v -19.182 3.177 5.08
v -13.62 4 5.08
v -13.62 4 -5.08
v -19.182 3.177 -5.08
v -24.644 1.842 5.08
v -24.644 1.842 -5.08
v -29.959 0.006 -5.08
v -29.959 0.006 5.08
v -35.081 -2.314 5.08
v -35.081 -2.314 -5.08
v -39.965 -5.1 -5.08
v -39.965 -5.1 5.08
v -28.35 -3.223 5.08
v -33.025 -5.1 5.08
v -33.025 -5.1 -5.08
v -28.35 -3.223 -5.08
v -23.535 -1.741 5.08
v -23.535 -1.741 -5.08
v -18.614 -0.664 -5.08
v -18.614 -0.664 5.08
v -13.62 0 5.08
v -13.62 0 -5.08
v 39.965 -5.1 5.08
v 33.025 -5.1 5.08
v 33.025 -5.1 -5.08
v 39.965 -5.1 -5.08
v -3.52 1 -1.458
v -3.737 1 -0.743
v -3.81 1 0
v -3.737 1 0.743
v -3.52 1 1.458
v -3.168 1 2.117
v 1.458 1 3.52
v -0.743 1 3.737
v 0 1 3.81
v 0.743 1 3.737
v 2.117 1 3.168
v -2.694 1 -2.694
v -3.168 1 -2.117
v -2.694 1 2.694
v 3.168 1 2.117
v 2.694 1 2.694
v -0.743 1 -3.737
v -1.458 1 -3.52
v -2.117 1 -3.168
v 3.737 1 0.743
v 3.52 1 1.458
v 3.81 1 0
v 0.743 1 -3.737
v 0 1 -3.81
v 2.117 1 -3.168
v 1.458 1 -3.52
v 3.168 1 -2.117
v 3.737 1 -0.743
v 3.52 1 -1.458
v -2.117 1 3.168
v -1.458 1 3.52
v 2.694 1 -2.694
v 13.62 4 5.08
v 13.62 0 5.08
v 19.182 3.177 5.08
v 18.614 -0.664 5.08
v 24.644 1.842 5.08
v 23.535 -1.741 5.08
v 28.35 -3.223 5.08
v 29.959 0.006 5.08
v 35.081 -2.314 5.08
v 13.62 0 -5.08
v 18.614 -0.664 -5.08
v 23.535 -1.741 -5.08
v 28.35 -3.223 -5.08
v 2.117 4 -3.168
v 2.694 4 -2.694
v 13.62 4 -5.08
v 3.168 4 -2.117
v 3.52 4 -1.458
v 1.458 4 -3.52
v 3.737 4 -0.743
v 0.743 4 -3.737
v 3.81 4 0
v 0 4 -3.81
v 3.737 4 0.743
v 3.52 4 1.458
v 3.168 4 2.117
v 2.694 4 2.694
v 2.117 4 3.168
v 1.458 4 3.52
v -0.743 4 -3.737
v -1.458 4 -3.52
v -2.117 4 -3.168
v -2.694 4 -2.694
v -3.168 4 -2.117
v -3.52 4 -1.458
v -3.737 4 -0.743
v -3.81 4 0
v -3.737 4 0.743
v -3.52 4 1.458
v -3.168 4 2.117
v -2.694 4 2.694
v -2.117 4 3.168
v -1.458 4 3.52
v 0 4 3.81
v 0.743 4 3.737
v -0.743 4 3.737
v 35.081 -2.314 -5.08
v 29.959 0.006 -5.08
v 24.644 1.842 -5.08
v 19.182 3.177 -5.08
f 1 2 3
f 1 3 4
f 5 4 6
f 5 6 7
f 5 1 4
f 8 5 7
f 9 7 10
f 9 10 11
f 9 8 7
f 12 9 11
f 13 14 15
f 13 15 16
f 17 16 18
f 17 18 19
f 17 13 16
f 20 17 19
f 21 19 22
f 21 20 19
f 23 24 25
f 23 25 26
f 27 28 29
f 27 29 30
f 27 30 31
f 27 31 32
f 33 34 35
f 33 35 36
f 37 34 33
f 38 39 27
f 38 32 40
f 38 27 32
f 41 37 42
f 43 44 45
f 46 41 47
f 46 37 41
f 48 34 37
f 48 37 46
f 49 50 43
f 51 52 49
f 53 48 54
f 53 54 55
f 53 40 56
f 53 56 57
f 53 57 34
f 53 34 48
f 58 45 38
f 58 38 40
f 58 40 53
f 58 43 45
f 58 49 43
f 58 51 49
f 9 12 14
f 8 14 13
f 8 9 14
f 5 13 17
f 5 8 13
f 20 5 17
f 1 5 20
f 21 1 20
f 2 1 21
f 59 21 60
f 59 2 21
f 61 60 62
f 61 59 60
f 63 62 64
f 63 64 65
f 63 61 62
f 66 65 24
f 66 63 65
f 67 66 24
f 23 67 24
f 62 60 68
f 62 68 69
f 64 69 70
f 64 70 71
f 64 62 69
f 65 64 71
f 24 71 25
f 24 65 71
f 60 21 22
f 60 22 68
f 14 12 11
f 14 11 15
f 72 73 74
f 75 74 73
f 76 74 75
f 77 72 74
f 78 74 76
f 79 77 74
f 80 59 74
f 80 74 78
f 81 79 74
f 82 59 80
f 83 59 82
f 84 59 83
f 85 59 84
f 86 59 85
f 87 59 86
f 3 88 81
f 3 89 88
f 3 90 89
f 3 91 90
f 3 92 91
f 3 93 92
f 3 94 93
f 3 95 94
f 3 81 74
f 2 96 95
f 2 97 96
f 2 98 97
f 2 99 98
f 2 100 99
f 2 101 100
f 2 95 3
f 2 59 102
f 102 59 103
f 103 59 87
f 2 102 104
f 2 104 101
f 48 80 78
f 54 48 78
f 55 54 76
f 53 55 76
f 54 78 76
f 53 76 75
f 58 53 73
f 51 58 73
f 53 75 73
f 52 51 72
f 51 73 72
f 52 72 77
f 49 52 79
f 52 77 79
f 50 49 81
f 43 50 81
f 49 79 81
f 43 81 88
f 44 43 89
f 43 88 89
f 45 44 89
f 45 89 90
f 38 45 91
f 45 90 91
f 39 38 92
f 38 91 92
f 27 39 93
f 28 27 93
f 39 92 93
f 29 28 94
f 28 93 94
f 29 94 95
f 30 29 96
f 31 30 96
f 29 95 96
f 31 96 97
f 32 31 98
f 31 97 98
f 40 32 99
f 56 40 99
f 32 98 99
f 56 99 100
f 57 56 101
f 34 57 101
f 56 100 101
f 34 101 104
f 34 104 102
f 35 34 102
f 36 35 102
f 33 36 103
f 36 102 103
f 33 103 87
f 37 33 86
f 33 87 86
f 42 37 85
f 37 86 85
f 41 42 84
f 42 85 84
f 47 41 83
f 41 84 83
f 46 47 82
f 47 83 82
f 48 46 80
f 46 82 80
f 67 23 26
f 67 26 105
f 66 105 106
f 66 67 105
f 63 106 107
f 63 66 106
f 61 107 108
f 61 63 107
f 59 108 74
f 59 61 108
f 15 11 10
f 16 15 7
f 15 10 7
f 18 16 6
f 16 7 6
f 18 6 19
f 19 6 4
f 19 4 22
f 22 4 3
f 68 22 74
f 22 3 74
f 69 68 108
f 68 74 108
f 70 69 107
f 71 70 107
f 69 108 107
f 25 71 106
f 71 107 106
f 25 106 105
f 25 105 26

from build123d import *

# Parameters (mm, degrees)
SKETCH1_W           = 15.24
SKETCH1_H           = 10.16
BOSS_EXTRUDE1_DEPTH = 4
BOSS_EXTRUDE2_DEPTH = 10.16
SKETCH3_R           = 3.81
CUT_EXTRUDE1_DEPTH  = 3


with BuildPart() as part:
    # Sketch1 → Boss-Extrude1 (new body)
    with BuildSketch(Plane(origin=(0, 0, 0), x_dir=(1, 0, 0), z_dir=(0, 1, 0))):
        Rectangle(SKETCH1_W, SKETCH1_H)
    extrude(amount=BOSS_EXTRUDE1_DEPTH)

    # Sketch2 → Boss-Extrude2 (add)
    with BuildSketch(Plane.XY.offset(5.08)):
        with BuildLine():
            Line((13.62, 4), (7.62, 4))
            Line((7.62, 4), (7.62, 0))
            Line((7.62, 0), (13.62, 0))
            ThreePointArc((13.62, 0), (23.535142279, -1.740916975), (33.025, -5.1))
            Line((33.025, -5.1), (39.965, -5.1))
            ThreePointArc((39.965, -5.1), (27.323058228, 0.985995221), (13.62, 4))
        make_face()
        with BuildLine():
            Line((-7.62, 0), (-7.62, 4))
            Line((-7.62, 4), (-13.62, 4))
            ThreePointArc((-13.62, 4), (-27.323058228, 0.985995221), (-39.965, -5.1))
            Line((-39.965, -5.1), (-33.025, -5.1))
            ThreePointArc((-33.025, -5.1), (-23.535142279, -1.740916975), (-13.62, 0))
            Line((-13.62, 0), (-7.62, 0))
        make_face()
    extrude(amount=-BOSS_EXTRUDE2_DEPTH)

    # Sketch3 → Cut-Extrude1 (cut)
    with BuildSketch(Plane(origin=(0, 4, 0), x_dir=(1, 0, 0), z_dir=(0, 1, 0))):
        Circle(SKETCH3_R)
    extrude(amount=-CUT_EXTRUDE1_DEPTH, mode=Mode.SUBTRACT)


solid = part.part
